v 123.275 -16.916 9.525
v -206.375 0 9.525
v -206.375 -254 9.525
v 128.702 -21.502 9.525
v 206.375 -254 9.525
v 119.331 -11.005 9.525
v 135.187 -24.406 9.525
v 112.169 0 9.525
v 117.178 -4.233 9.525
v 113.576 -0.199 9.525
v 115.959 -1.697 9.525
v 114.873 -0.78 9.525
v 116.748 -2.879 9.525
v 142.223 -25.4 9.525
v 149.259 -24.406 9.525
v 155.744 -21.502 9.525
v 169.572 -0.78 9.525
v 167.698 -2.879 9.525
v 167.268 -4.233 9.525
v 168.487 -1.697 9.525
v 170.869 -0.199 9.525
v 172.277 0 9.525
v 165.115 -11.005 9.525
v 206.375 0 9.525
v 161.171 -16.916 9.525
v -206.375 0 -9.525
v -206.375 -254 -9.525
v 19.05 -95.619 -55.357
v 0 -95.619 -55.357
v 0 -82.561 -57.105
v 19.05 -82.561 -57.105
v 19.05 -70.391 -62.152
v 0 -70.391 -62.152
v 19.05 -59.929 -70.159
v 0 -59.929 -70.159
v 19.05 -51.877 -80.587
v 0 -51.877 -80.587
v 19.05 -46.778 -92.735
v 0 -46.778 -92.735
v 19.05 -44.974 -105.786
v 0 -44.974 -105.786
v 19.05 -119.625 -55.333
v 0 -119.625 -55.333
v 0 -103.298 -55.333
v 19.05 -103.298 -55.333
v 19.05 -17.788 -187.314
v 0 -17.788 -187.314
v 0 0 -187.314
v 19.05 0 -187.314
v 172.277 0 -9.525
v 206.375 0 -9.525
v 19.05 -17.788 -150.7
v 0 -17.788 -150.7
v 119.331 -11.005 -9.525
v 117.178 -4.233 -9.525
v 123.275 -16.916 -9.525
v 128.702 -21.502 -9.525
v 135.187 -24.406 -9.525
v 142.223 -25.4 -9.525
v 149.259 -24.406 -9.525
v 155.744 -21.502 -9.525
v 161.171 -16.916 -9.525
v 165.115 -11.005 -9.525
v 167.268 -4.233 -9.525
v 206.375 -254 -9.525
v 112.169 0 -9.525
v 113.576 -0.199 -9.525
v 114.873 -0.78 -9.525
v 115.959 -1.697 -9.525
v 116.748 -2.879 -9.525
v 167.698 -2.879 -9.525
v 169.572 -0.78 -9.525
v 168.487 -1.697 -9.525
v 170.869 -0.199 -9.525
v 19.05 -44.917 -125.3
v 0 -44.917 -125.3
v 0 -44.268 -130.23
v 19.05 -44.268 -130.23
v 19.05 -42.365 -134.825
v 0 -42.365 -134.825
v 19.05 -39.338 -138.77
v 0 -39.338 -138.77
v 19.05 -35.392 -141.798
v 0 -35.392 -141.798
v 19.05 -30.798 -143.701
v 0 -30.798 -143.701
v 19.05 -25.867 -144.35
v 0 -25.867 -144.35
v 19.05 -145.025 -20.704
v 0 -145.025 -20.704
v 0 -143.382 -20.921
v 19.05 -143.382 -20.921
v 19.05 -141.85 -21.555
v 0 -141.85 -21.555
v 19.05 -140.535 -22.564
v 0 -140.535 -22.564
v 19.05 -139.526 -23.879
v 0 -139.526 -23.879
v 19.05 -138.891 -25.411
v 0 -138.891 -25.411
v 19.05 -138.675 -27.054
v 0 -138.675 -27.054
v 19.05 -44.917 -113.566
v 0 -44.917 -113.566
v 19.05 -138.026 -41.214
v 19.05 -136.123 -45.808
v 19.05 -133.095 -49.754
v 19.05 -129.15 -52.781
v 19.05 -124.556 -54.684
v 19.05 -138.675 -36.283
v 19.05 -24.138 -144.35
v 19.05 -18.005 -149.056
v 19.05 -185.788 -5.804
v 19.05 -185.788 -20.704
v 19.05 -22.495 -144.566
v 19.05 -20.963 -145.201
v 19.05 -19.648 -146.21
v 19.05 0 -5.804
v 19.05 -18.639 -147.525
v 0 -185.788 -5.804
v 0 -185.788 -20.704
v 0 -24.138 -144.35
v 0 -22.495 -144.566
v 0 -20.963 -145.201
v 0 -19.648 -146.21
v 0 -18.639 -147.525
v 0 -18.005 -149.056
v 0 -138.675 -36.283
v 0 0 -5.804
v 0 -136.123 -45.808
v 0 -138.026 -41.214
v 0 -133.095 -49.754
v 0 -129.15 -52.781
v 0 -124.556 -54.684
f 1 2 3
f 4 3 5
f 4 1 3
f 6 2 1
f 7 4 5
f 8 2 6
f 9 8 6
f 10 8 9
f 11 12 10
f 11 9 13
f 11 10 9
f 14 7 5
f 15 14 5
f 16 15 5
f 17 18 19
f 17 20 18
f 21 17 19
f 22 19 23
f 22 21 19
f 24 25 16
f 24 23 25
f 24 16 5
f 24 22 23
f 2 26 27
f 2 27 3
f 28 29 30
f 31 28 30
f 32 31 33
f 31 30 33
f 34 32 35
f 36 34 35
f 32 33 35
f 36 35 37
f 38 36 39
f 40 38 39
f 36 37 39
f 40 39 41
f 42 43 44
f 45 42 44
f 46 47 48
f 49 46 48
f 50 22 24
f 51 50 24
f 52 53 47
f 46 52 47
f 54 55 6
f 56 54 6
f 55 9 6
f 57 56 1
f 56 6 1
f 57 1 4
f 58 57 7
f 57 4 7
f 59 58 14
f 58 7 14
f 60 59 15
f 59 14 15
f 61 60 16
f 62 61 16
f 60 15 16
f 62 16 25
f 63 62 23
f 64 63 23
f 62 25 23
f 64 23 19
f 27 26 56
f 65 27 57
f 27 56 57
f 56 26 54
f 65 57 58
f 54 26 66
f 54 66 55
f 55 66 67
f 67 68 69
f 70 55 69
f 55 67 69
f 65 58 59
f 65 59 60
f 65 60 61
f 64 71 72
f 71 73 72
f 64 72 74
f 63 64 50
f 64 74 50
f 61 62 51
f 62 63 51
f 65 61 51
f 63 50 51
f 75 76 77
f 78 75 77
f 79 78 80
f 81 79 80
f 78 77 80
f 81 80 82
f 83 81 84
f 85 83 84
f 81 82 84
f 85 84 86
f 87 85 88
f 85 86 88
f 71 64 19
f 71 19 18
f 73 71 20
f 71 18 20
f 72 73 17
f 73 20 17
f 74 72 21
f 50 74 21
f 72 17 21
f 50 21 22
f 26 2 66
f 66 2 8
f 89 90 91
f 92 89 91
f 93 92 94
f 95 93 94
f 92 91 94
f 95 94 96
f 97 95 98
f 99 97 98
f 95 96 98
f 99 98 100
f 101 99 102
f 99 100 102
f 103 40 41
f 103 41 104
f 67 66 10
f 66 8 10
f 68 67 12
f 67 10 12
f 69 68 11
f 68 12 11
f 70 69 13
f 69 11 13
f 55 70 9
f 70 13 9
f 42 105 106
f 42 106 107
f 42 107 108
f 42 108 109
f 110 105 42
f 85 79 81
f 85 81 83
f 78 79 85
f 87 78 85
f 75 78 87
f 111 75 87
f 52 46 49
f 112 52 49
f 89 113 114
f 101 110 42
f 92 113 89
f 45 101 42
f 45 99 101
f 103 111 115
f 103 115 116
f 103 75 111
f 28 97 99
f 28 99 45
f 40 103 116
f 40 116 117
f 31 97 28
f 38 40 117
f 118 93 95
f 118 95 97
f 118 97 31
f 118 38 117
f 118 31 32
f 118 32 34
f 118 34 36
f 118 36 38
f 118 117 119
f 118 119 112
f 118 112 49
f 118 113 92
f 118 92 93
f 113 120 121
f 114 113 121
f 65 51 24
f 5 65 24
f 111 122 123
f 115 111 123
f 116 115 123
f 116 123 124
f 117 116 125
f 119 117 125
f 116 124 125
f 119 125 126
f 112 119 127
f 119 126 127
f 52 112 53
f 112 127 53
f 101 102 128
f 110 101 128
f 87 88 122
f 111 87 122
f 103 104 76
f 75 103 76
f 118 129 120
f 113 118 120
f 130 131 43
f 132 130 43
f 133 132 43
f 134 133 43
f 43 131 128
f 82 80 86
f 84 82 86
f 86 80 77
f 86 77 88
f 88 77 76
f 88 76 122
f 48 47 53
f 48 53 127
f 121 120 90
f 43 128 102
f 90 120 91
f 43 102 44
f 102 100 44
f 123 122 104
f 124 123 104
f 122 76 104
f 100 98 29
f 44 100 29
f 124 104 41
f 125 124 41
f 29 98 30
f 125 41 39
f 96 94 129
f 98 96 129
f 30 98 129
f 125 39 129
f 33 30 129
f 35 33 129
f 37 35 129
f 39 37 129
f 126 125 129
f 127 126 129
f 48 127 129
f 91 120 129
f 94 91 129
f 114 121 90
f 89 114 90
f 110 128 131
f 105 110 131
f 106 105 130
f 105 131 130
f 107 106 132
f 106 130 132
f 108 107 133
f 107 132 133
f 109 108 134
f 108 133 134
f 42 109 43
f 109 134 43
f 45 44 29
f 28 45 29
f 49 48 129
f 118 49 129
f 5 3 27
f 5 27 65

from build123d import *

# Parameters (mm, degrees)
F0_W     = 412.75
F0_H     = 19.05
F1_DEPTH = 254
F3_DEPTH = 19.05
F4_R     = 25.4
F5_DEPTH = 27.87562
F6_R     = 5.08


with BuildPart() as f1:
    # F0 (on Front) → F1 (new body)
    with BuildSketch(Plane.XZ):
        Rectangle(F0_W, F0_H)
    extrude(amount=F1_DEPTH)

    # F4 (on Top) → F5 (cut, symmetric)
    with BuildSketch(Plane.XY):
        with Locations((142.2228491536, 0)):
            Circle(F4_R)
    extrude(amount=F5_DEPTH, both=True, mode=Mode.SUBTRACT)

    # F6
    f6_edges = [f1.edges().sort_by_distance(p)[0] for p in [
        (116.822849, 0, 0),
        (167.622849, 0, 0),
    ]]
    fillet(f6_edges, radius=F6_R)


with BuildPart() as f3:
    # F2 (on Right) → F3 (new body)
    with BuildSketch(Plane.YZ):
        with BuildLine():
            Line((0, -187.3135023741), (0, -5.8043615216))
            Line((0, -5.8043615216), (-185.7877916402, -5.8043615216))
            Line((-185.7877916402, -5.8043615216), (-185.7877916402, -20.7043622875))
            Line((-185.7877916402, -20.7043622875), (-145.0251117239, -20.7043622875))
            ThreePointArc((-145.0251117239, -20.7043622875), (-140.5349836633, -22.5642342269), (-138.6751117239, -27.0543622875))
            Line((-138.6751117239, -27.0543622875), (-138.6751117239, -36.283469063))
            ThreePointArc((-138.6751117239, -36.283469063), (-133.0954959055, -49.7538532446), (-119.6251117239, -55.333469063))
            Line((-119.6251117239, -55.333469063), (-103.2980829477, -55.333469063))
            Line((-103.2980829477, -55.333469063), (-95.6189539141, -55.3567205599))
            ThreePointArc((-95.6189539141, -55.3567205599), (-59.9285427417, -70.1588294385), (-44.9741228903, -105.7856901451))
            Line((-44.9741228903, -105.7856901451), (-44.9173282883, -113.5664560823))
            Line((-44.9173282883, -113.5664560823), (-44.9173282883, -125.2999826817))
            ThreePointArc((-44.9173282883, -125.2999826817), (-39.3377124699, -138.7703668633), (-25.8673282883, -144.3499826817))
            Line((-25.8673282883, -144.3499826817), (-24.1382742187, -144.3499826817))
            ThreePointArc((-24.1382742187, -144.3499826817), (-19.6481461582, -146.2098546212), (-17.7882742187, -150.6999826817))
            Line((-17.7882742187, -150.6999826817), (-17.7882742187, -187.3135023741))
            Line((-17.7882742187, -187.3135023741), (0, -187.3135023741))
        make_face()
    extrude(amount=F3_DEPTH)


solid = Compound([f1.part, f3.part])
